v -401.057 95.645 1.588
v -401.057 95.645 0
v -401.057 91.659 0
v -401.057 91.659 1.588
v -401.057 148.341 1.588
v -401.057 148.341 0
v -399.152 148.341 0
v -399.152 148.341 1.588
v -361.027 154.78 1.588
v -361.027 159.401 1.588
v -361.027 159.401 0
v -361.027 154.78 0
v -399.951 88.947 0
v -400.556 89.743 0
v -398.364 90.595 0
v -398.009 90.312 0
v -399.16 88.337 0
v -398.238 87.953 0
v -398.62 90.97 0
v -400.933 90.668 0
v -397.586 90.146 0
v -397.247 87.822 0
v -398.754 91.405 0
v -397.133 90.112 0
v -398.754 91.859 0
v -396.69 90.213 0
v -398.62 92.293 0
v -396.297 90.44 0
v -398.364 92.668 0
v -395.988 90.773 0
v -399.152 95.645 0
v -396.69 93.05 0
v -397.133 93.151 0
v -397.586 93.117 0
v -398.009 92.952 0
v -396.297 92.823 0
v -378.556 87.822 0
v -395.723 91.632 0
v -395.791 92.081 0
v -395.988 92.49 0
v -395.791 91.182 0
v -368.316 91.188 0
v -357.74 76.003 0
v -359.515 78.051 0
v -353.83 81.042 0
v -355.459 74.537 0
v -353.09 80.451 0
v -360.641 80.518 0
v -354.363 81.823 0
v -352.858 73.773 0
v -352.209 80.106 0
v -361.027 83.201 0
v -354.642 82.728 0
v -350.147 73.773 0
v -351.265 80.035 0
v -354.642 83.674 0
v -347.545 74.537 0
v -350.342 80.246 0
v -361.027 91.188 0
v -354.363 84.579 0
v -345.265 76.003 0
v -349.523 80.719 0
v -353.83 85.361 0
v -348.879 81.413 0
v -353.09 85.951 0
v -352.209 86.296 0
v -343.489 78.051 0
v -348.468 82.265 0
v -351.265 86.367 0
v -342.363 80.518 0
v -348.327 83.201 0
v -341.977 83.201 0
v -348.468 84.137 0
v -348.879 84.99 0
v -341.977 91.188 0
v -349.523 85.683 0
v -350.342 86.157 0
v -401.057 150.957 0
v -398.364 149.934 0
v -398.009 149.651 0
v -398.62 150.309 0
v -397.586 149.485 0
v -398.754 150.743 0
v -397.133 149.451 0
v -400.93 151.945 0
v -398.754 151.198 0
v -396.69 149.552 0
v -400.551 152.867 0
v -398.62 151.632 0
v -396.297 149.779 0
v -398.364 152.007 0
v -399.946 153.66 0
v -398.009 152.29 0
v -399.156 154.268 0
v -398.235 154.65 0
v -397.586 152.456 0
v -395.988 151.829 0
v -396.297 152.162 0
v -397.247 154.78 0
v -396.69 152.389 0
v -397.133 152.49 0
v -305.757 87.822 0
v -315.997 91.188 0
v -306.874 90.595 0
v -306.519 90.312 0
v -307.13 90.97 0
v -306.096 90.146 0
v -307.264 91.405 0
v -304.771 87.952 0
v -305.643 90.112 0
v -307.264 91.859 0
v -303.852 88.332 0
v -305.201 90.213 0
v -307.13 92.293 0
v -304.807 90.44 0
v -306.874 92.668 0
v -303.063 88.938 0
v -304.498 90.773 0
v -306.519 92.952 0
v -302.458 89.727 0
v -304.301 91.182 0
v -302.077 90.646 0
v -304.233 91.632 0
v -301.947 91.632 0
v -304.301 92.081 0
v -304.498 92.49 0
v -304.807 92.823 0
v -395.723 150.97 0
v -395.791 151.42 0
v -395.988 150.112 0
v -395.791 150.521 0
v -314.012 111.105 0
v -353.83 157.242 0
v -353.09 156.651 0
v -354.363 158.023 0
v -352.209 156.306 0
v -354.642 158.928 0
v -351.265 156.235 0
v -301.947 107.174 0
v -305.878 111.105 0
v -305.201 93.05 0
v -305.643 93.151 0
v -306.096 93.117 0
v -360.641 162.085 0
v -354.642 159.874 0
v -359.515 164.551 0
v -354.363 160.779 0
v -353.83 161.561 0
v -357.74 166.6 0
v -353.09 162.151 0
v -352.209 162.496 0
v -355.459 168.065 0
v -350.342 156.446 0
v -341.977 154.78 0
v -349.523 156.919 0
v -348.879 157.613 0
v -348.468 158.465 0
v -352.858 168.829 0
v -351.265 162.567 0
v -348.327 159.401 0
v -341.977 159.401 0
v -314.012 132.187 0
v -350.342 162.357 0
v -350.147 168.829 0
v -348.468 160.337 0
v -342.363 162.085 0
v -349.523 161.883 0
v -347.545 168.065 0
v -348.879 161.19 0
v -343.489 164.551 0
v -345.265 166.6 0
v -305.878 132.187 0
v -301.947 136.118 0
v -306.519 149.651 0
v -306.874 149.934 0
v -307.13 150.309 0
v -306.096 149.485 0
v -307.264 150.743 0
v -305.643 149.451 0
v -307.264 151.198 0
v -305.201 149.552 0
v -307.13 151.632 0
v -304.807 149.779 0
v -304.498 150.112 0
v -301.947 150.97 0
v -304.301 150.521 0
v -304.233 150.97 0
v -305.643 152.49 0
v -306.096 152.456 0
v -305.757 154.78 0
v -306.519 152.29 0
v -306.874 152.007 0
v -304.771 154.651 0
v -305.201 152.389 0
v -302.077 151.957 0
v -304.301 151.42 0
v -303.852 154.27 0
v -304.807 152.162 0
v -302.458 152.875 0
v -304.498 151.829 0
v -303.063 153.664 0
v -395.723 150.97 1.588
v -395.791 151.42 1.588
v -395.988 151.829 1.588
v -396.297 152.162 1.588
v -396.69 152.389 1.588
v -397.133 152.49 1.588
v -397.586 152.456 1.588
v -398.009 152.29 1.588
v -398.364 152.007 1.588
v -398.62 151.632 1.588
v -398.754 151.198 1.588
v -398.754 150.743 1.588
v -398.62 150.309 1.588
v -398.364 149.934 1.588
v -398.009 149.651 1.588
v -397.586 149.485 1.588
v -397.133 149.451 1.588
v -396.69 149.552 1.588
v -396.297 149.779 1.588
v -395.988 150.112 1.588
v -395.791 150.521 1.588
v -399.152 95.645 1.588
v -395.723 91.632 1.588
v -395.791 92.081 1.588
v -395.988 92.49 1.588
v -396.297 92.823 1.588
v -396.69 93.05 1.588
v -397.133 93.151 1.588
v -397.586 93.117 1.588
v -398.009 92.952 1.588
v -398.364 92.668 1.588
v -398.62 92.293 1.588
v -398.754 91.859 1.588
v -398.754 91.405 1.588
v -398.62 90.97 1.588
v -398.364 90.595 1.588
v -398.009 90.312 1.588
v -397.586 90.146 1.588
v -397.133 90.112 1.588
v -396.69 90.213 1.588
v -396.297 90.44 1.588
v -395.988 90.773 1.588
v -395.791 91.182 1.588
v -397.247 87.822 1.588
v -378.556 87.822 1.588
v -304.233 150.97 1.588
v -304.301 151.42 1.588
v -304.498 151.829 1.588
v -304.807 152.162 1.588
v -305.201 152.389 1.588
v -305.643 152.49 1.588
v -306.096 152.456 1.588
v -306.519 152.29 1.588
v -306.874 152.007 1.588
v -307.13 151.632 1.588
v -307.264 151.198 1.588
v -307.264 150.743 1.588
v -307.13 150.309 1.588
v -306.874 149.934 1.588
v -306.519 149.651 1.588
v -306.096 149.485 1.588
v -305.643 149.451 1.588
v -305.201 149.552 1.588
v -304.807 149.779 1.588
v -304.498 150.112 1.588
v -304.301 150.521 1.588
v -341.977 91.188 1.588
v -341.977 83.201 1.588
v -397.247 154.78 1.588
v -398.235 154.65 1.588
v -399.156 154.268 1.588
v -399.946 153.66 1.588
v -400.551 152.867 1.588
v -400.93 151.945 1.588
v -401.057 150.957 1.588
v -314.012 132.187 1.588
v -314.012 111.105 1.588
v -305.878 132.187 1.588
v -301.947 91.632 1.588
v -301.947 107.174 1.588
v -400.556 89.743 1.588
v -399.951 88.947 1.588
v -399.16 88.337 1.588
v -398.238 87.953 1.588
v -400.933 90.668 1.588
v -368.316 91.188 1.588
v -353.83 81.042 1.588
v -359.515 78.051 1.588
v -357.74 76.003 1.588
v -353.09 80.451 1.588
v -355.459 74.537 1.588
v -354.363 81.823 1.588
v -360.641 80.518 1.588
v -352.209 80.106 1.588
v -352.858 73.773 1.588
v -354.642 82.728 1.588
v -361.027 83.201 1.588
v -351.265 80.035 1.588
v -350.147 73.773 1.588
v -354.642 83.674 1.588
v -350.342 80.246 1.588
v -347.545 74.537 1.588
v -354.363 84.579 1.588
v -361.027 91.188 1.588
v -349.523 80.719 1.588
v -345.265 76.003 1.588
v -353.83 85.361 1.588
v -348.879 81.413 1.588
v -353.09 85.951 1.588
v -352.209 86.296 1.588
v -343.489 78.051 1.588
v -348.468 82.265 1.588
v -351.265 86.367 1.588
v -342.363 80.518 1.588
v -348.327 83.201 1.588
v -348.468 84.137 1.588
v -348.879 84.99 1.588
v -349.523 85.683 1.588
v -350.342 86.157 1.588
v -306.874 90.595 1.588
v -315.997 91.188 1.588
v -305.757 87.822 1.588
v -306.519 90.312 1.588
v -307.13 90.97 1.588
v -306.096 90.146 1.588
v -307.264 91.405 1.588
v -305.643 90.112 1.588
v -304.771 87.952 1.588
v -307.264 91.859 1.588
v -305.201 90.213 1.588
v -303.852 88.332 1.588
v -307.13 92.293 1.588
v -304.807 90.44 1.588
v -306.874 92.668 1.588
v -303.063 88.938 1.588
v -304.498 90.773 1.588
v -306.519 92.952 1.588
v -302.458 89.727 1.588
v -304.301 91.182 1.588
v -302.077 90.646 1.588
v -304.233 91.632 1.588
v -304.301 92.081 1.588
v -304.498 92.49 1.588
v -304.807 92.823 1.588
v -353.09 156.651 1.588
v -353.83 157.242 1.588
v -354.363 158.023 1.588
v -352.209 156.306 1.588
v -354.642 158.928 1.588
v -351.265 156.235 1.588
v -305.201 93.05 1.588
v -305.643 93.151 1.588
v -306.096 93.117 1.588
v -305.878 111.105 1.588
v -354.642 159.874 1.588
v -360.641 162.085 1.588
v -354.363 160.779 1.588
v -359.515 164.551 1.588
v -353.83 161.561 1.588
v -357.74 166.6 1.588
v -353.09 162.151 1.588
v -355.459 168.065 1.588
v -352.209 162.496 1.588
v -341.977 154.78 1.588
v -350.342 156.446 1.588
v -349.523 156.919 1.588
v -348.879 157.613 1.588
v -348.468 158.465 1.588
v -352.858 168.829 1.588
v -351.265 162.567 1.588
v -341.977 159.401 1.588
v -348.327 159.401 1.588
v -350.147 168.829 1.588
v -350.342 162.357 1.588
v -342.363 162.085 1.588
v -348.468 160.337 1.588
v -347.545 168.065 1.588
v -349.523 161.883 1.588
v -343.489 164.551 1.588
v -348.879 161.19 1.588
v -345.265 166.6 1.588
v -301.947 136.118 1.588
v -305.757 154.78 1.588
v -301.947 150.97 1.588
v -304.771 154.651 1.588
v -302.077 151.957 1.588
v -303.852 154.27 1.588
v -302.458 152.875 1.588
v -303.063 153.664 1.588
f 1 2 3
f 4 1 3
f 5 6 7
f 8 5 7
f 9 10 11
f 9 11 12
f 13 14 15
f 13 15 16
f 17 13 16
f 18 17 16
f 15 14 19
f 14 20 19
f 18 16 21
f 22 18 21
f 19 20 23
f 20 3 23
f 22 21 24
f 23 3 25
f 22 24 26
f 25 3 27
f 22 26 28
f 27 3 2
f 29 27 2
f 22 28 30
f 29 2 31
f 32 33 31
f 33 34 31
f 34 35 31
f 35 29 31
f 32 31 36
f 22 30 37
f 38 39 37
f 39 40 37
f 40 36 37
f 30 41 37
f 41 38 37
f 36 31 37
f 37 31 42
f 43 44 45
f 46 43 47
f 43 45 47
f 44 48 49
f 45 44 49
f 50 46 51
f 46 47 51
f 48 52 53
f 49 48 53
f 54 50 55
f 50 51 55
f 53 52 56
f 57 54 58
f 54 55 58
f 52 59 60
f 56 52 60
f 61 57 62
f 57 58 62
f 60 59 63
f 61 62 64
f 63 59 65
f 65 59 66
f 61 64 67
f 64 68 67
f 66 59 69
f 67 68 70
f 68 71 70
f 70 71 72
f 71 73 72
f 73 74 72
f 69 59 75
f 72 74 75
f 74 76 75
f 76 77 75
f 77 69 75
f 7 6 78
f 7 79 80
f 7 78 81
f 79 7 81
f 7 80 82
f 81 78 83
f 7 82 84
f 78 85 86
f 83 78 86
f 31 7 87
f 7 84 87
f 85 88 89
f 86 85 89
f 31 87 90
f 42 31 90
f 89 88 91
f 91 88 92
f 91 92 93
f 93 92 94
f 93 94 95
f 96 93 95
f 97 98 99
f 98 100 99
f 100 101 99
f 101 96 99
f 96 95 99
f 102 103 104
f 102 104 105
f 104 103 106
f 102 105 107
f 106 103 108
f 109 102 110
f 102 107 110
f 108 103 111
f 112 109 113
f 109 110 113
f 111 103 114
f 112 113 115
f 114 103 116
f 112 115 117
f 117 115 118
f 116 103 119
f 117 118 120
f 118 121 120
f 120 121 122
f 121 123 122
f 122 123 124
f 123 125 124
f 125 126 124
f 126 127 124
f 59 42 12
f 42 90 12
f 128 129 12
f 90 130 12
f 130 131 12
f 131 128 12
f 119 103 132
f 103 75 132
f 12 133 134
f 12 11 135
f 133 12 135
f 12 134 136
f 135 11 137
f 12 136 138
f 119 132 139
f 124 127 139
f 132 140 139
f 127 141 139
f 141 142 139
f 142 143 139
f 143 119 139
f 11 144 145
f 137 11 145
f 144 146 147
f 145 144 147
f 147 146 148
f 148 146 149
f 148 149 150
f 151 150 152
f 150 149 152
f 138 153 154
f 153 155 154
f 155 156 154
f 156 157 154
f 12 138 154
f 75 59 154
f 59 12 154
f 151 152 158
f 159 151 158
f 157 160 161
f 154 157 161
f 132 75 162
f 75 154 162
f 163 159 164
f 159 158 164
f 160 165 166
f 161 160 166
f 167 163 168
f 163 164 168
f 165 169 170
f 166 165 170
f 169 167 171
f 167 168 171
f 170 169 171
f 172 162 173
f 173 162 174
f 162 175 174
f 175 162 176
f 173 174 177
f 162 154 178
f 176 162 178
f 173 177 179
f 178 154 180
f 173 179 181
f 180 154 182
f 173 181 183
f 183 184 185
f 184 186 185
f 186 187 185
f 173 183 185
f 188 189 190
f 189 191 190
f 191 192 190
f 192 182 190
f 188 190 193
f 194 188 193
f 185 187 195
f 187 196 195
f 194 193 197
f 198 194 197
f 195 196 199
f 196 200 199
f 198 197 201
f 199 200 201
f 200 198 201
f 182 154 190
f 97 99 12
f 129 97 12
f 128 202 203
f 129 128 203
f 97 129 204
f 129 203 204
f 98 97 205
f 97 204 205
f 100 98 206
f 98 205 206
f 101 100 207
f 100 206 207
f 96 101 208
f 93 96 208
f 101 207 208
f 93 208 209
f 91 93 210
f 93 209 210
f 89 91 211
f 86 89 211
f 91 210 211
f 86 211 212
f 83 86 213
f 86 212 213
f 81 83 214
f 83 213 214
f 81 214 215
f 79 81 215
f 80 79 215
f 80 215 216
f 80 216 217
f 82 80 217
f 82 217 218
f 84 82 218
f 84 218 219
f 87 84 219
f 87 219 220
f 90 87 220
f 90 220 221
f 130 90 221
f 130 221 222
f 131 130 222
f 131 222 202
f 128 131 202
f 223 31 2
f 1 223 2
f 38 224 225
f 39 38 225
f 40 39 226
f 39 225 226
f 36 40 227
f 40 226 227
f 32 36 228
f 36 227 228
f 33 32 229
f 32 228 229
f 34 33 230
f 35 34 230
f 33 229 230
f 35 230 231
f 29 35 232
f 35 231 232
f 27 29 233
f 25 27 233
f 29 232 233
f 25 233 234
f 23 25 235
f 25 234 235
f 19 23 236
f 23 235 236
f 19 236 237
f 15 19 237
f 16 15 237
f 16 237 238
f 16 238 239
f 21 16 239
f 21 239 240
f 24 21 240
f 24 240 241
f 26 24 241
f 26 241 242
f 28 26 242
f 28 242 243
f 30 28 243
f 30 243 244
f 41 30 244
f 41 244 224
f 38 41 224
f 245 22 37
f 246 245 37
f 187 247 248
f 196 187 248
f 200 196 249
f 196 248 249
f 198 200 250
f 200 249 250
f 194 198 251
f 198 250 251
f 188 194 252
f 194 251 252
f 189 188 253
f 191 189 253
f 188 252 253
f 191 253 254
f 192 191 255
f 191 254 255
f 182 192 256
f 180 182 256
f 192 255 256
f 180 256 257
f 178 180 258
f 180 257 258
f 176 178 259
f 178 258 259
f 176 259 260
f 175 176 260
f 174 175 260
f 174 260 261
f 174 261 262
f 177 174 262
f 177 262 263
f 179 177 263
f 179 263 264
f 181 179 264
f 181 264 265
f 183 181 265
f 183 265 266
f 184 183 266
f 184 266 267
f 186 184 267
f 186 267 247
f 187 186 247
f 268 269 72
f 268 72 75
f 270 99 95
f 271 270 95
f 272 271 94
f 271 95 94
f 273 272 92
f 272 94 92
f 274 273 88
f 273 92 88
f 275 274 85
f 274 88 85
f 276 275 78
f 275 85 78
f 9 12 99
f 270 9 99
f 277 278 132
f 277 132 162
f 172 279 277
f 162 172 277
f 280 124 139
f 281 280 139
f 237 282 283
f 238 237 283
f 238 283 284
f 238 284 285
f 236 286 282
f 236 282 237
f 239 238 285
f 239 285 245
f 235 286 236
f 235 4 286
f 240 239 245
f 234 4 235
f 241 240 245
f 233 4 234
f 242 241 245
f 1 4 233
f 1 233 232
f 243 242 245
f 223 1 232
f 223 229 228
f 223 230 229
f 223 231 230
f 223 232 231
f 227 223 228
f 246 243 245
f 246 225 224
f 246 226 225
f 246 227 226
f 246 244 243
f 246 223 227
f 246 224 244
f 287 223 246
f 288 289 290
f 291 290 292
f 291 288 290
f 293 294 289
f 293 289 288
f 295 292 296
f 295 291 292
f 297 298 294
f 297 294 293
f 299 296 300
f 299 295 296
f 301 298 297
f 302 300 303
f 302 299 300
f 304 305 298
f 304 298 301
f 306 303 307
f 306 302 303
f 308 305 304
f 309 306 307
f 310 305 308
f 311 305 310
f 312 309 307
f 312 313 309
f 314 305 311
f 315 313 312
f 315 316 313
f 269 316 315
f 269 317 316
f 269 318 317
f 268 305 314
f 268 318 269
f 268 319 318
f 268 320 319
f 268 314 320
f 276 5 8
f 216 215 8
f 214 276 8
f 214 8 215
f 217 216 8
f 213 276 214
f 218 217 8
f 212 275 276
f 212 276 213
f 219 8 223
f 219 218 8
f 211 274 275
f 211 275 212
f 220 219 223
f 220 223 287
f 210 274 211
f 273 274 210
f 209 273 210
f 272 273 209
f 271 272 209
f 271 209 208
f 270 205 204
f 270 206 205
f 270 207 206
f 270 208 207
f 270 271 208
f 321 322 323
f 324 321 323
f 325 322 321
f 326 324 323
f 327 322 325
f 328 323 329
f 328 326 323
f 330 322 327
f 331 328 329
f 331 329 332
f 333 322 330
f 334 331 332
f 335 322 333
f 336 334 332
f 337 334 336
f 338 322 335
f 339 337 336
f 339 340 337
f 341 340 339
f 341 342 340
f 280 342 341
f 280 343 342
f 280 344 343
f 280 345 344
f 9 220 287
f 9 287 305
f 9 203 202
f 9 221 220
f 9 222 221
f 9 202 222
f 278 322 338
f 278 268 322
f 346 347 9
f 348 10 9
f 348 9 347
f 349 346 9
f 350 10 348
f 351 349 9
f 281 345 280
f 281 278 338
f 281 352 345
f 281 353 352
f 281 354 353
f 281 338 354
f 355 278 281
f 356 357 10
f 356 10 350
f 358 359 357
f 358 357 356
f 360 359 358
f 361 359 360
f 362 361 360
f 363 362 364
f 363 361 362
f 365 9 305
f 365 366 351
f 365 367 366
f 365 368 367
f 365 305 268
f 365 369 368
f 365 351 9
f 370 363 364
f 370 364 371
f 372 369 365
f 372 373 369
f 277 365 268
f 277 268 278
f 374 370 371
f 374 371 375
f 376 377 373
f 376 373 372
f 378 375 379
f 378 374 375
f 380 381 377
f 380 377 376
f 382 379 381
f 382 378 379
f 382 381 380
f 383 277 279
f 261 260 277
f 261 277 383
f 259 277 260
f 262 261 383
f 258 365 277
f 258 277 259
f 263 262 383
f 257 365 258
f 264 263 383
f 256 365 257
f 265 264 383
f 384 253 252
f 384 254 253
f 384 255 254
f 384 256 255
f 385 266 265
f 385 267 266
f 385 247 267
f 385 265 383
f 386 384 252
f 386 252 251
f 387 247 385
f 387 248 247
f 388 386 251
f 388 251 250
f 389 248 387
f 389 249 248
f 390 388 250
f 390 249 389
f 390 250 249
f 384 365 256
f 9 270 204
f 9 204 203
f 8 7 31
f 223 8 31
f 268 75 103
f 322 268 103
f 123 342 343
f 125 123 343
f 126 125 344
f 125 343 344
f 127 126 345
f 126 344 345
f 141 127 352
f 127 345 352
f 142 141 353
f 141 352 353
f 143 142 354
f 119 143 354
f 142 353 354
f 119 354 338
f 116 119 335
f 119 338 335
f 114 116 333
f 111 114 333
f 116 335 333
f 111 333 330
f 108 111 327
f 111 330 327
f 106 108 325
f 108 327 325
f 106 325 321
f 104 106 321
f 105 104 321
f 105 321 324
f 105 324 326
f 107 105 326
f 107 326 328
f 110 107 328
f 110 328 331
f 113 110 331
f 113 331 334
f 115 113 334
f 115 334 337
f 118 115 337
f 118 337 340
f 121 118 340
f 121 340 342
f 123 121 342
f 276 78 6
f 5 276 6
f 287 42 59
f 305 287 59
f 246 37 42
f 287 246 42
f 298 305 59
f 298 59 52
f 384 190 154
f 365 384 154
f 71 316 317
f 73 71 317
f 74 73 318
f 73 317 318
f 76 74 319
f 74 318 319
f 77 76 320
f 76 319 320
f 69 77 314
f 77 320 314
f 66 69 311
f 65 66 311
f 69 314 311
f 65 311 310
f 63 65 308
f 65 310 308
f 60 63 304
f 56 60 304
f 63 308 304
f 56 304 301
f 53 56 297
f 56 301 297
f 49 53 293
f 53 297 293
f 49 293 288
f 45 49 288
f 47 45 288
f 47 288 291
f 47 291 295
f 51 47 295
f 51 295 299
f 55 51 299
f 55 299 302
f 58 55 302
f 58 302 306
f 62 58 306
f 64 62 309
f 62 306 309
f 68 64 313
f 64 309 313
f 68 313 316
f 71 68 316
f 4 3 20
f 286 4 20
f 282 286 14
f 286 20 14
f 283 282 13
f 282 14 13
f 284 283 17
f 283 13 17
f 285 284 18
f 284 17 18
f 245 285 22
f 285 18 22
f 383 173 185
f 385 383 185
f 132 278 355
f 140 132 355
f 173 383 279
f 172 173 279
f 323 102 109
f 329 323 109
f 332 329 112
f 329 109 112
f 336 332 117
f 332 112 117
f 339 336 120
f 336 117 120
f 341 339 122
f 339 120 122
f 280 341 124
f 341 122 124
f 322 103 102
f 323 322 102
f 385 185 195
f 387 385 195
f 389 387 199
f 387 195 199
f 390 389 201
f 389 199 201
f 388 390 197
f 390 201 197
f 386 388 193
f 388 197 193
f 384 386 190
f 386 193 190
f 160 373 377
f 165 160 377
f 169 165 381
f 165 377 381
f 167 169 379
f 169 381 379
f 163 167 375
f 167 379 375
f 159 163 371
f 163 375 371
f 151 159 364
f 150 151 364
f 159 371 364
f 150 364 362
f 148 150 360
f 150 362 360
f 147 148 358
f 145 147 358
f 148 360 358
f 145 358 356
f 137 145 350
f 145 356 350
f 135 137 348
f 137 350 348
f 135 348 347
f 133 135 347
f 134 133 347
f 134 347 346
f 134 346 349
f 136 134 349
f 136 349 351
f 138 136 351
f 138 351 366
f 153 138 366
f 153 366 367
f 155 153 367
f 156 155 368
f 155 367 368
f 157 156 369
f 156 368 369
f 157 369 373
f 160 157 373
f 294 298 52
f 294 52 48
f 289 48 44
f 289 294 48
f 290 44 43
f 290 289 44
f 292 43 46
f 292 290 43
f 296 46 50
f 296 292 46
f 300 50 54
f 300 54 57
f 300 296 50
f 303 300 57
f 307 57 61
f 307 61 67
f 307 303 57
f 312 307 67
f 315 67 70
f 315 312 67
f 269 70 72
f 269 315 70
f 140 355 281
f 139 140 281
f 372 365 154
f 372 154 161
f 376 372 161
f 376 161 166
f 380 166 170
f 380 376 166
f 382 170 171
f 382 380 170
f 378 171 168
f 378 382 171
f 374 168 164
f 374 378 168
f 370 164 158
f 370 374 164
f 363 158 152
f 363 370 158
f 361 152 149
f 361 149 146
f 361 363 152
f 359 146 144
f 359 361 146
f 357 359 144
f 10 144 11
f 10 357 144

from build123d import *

# Parameters (mm, degrees)
SKETCH1_R           = 1.355900406
BOSS_EXTRUDE1_DEPTH = 1.5875
SKETCH2_R           = 3.175
BOSS_EXTRUDE2_DEPTH = 1.5875
SKETCH3_R           = 1.524
CUT_EXTRUDE1_DEPTH  = 436.184338179
CUT_EXTRUDE2_DEPTH  = 436.184338179
SKETCH5_W           = 2.0955
SKETCH5_H           = 13.208
BOSS_EXTRUDE3_DEPTH = 1.5875


with BuildPart() as part:
    # Sketch1 → Boss-Extrude1 (new body)
    with BuildSketch(Plane.XY):
        with BuildLine():
            Line((-301.9473, 111.74645), (-305.87795, 115.6771))
            Line((-305.87795, 115.6771), (-316.1078, 115.6771))
            Line((-316.1078, 115.6771), (-316.1078, 128.8851))
            Line((-316.1078, 128.8851), (-305.87795, 128.8851))
            Line((-305.87795, 128.8851), (-301.9473, 132.81575))
            Line((-301.9473, 132.81575), (-301.9473, 150.9704))
            ThreePointArc((-301.9473, 150.9704), (-303.063223164, 153.664476836), (-305.7573, 154.7804))
            Line((-305.7573, 154.7804), (-397.247125, 154.7804))
            ThreePointArc((-397.247125, 154.7804), (-399.946077222, 153.659592612), (-401.0571, 150.956597849))
            Line((-401.0571, 150.956597849), (-401.0571, 148.341))
            Line((-401.0571, 148.341), (-399.1521, 148.341))
            Line((-399.1521, 148.341), (-399.1521, 95.6449))
            Line((-399.1521, 95.6449), (-401.0571, 95.6449))
            Line((-401.0571, 95.6449), (-401.0571, 91.659304166))
            ThreePointArc((-401.0571, 91.659304166), (-399.951018769, 88.947400452), (-397.2472, 87.8217))
            Line((-397.2472, 87.8217), (-378.5565, 87.8217))
            Line((-378.5565, 87.8217), (-368.3165, 91.1883))
            Line((-368.3165, 91.1883), (-315.9973, 91.1883))
            Line((-315.9973, 91.1883), (-305.7573, 87.8217))
            ThreePointArc((-305.7573, 87.8217), (-303.063223164, 88.937623164), (-301.9473, 91.6317))
            Line((-301.9473, 91.6317), (-301.9473, 111.74645))
        make_face()
        with Locations((-305.7573, 91.6317)):
            Circle(SKETCH1_R, mode=Mode.SUBTRACT)
        with Locations((-305.7573, 150.9704)):
            Circle(SKETCH1_R, mode=Mode.SUBTRACT)
        with Locations((-397.247125, 150.9704)):
            Circle(SKETCH1_R, mode=Mode.SUBTRACT)
        with Locations((-397.2472, 91.6317)):
            Circle(SKETCH1_R, mode=Mode.SUBTRACT)
    extrude(amount=BOSS_EXTRUDE1_DEPTH)

    # Sketch2 → Boss-Extrude2 (add)
    # profile 1 of 2: a face of its own
    with BuildSketch(Plane.XY.offset(1.5875)):
        with BuildLine():
            Line((-361.0272, 159.40105), (-361.0272, 154.7804))
            Line((-361.0272, 154.7804), (-341.9772, 154.7804))
            Line((-341.9772, 154.7804), (-341.9772, 159.40105))
            ThreePointArc((-341.9772, 159.40105), (-351.5022, 168.92605), (-361.0272, 159.40105))
        make_face()
        with Locations((-351.5022, 159.40105)):
            Circle(SKETCH2_R, mode=Mode.SUBTRACT)
    # profile 2 of 2: a face of its own
    with BuildSketch(Plane.XY.offset(1.5875)):
        with BuildLine():
            Line((-341.9772, 91.1883), (-361.0272, 91.1883))
            Line((-361.0272, 91.1883), (-361.0272, 83.20105))
            ThreePointArc((-361.0272, 83.20105), (-351.5022, 73.67605), (-341.9772, 83.20105))
            Line((-341.9772, 83.20105), (-341.9772, 91.1883))
        make_face()
        with Locations((-351.5022, 83.20105)):
            Circle(SKETCH2_R, mode=Mode.SUBTRACT)
    extrude(amount=-BOSS_EXTRUDE2_DEPTH)

    # Sketch3 → Cut-Extrude1 (cut, through all)
    with BuildSketch(Plane.XY.offset(1.5875)):
        with Locations((-397.247125, 150.9704)):
            Circle(SKETCH3_R)
        with Locations((-305.7573, 150.9704)):
            Circle(SKETCH3_R)
        with Locations((-305.7573, 91.6317)):
            Circle(SKETCH3_R)
        with Locations((-397.2472, 91.6317)):
            Circle(SKETCH3_R)
    extrude(amount=-CUT_EXTRUDE1_DEPTH, mode=Mode.SUBTRACT)

    # Sketch4 → Cut-Extrude2 (cut, through all)
    with BuildSketch(Plane.XY.offset(1.5875)):
        Polygon((-301.9473, 136.11775), (-305.87795, 132.1871), (-314.0123, 132.1871), (-314.0123, 111.1051), (-305.87795, 111.1051), (-301.9473, 107.17445), align=None)
    extrude(amount=-CUT_EXTRUDE2_DEPTH, mode=Mode.SUBTRACT)

    # Sketch5 → Boss-Extrude3 (add)
    with BuildSketch(Plane.XY.offset(1.5875)):
        with Locations((-315.06005, 122.2811)):
            Rectangle(SKETCH5_W, SKETCH5_H)
    extrude(amount=-BOSS_EXTRUDE3_DEPTH)


solid = part.part
